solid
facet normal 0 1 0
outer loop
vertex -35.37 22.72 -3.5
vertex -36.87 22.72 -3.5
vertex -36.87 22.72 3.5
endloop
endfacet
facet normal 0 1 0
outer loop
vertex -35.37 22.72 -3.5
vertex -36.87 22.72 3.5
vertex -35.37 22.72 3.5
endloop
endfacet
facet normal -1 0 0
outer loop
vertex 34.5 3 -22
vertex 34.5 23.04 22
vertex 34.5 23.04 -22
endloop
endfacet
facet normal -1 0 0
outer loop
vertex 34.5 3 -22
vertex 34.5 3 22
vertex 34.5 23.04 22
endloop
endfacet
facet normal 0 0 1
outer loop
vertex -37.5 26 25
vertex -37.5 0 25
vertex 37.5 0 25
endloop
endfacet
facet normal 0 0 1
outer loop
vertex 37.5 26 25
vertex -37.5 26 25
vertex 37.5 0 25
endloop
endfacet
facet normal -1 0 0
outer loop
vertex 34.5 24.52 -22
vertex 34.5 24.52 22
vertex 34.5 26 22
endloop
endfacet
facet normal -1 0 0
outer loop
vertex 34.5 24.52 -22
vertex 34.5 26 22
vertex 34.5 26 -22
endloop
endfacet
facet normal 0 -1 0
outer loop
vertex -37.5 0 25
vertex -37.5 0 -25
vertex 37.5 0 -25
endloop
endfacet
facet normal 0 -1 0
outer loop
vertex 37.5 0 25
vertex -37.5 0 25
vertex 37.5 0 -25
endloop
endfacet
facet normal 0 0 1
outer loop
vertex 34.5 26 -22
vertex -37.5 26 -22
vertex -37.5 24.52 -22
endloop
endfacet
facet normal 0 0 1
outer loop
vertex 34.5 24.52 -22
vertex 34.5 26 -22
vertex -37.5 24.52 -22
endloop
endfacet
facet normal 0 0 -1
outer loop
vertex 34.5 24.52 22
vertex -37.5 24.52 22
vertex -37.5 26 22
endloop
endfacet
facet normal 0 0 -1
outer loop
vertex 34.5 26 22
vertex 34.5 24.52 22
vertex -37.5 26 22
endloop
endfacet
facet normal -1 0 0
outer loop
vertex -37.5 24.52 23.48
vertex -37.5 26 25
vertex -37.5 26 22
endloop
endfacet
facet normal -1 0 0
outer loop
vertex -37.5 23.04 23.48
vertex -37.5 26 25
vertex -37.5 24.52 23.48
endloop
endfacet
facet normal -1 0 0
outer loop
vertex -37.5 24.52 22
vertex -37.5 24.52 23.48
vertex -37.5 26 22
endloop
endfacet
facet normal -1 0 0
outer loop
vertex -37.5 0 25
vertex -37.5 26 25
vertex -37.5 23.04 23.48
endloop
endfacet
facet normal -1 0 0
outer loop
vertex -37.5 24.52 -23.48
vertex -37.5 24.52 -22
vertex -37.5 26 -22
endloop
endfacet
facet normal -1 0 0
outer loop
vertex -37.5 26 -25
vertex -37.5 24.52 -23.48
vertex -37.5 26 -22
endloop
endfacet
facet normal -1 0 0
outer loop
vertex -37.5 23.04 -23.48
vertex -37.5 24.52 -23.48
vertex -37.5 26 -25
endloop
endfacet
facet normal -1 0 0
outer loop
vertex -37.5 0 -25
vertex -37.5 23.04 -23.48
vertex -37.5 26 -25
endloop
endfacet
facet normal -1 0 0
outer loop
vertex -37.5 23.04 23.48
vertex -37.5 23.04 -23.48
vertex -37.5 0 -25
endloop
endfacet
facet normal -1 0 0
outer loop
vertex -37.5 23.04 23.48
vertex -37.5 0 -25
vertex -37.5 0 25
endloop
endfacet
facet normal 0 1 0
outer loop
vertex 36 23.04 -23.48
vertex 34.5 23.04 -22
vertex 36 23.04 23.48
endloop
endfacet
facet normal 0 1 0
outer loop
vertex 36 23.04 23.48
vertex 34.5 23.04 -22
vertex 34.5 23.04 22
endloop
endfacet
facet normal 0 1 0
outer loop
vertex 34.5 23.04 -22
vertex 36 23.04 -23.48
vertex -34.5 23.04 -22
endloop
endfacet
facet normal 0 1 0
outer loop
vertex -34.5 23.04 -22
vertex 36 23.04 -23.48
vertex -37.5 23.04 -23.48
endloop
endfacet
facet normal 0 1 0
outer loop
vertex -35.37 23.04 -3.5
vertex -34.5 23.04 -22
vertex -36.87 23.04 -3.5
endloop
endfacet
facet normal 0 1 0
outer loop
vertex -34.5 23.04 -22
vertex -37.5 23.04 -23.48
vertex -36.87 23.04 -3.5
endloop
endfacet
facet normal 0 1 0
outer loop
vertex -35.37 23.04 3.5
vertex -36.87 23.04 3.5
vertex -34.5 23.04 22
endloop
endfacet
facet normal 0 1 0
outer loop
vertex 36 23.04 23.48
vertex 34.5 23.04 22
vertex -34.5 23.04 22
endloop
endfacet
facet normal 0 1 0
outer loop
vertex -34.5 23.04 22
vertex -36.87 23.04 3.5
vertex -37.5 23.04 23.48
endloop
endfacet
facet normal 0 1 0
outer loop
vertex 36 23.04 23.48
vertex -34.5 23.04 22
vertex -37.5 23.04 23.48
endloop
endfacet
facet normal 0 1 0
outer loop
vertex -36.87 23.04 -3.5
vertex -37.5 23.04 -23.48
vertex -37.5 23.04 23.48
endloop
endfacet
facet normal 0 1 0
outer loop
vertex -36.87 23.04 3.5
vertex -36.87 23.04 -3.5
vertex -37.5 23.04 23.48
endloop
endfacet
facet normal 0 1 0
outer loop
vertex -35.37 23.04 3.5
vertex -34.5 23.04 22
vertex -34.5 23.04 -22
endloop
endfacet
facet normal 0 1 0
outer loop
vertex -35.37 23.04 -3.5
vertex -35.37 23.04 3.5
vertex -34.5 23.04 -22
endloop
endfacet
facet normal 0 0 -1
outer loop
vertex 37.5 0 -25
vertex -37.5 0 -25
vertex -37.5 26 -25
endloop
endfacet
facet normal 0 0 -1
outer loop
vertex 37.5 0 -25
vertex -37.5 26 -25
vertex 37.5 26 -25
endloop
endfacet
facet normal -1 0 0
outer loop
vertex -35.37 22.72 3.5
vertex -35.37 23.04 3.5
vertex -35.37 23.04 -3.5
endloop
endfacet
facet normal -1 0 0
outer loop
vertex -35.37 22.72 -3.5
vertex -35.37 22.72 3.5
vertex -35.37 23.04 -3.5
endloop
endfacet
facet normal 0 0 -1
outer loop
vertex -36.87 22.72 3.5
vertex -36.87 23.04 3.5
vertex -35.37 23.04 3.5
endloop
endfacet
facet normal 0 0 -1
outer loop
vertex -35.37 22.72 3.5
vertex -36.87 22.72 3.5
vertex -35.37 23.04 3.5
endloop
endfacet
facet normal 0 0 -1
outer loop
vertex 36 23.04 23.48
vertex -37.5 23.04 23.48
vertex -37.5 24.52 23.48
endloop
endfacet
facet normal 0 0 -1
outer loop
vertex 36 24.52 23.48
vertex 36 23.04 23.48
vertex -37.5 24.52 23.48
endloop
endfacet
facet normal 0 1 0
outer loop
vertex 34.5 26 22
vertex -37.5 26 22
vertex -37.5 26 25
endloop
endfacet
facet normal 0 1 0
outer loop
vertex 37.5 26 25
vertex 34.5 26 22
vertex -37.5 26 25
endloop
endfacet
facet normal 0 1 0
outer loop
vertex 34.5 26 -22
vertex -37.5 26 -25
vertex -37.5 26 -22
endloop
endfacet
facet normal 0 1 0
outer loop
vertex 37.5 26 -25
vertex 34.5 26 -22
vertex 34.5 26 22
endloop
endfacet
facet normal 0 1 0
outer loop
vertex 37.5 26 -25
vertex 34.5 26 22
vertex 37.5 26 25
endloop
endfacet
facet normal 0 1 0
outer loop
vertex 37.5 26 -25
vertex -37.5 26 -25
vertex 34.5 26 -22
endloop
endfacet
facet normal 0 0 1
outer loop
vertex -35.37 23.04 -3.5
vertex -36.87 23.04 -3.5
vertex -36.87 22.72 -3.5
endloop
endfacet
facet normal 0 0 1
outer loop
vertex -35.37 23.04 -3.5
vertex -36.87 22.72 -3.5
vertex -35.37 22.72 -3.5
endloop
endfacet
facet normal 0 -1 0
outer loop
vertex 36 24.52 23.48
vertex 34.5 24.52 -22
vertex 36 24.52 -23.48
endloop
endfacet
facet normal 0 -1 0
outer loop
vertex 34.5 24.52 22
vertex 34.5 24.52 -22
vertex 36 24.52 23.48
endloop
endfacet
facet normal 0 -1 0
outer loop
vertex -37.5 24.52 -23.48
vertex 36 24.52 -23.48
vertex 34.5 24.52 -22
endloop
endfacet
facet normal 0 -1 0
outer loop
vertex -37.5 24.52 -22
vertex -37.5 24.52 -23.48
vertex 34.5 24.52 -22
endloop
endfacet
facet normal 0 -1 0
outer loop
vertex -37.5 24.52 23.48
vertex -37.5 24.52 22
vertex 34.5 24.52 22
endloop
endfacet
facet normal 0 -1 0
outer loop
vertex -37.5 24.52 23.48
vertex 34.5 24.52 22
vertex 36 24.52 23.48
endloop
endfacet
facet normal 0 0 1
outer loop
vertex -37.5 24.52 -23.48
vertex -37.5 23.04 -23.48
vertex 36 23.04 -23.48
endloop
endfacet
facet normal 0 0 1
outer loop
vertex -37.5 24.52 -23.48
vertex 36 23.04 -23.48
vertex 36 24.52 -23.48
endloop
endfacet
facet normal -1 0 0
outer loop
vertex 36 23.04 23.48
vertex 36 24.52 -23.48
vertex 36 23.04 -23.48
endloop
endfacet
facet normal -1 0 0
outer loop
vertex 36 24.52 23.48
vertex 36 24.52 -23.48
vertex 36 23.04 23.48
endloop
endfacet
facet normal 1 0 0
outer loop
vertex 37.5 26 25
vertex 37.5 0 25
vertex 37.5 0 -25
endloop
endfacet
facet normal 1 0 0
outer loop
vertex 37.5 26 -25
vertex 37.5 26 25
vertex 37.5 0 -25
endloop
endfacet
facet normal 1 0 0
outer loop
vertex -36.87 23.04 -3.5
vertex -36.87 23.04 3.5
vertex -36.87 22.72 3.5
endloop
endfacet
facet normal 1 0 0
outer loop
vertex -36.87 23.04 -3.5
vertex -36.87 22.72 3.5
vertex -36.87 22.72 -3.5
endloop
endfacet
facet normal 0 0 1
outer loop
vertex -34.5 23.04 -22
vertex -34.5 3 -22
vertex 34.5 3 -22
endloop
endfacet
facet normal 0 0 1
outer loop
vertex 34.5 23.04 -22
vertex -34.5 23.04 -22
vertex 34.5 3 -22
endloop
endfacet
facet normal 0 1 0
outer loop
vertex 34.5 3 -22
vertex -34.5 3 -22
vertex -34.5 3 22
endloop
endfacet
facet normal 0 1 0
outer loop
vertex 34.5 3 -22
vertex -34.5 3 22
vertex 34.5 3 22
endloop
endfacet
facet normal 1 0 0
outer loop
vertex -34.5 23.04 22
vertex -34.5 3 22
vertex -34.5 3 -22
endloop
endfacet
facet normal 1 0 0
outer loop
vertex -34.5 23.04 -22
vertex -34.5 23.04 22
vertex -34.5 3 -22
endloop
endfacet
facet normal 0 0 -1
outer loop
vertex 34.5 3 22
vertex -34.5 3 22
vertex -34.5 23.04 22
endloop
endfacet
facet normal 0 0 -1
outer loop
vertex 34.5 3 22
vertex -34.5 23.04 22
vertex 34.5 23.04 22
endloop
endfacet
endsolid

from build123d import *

# Parameters (mm, degrees)
CROQUIS1_W              = 75
CROQUIS1_H              = 50
CROQUIS1_W_2            = 69
CROQUIS1_H_2            = 44
SALIENTE_EXTRUIR1_DEPTH = 26
CROQUIS1_2_W            = 69
CROQUIS1_2_H            = 44
SALIENTE_EXTRUIR2_DEPTH = 3
CORTAR_EXTRUIR1_DEPTH   = 72
CROQUIS4_W              = 46.96
CROQUIS4_H              = 1.48
CORTAR_EXTRUIR2_DEPTH   = 1.5
CROQUIS7_W              = 1.5
CROQUIS7_H              = 7
CORTAR_EXTRUIR3_DEPTH   = 0.32


with BuildPart() as part:
    # Croquis1 → Saliente-Extruir1 (new body)
    with BuildSketch(Plane(origin=(0, 0, 0), x_dir=(1, 0, 0), z_dir=(0, 1, 0))):
        Rectangle(CROQUIS1_W, CROQUIS1_H)
        Rectangle(CROQUIS1_W_2, CROQUIS1_H_2, mode=Mode.SUBTRACT)
    extrude(amount=SALIENTE_EXTRUIR1_DEPTH)

    # Croquis1<2> → Saliente-Extruir2 (add)
    with BuildSketch(Plane(origin=(0, 0, 0), x_dir=(1, 0, 0), z_dir=(0, 1, 0))):
        Rectangle(CROQUIS1_2_W, CROQUIS1_2_H)
    extrude(amount=SALIENTE_EXTRUIR2_DEPTH)

    # Croquis3 → Cortar-Extruir1 (cut)
    with BuildSketch(Plane.ZY.offset(37.5)):
        Polygon((22, 26), (-22, 26), (-22, 24.52), (-23.48, 24.52), (-23.48, 23.04), (23.48, 23.04), (23.48, 24.52), (22, 24.52), align=None)
    extrude(amount=-CORTAR_EXTRUIR1_DEPTH, mode=Mode.SUBTRACT)

    # Croquis4 → Cortar-Extruir2 (cut)
    with BuildSketch(Plane.ZY.offset(-34.5)):
        with Locations((0, 23.78)):
            Rectangle(CROQUIS4_W, CROQUIS4_H)
    extrude(amount=-CORTAR_EXTRUIR2_DEPTH, mode=Mode.SUBTRACT)

    # Croquis7 → Cortar-Extruir3 (cut)
    with BuildSketch(Plane(origin=(0, 23.04, 0), x_dir=(1, 0, 0), z_dir=(0, 1, 0))):
        with Locations((-36.12, 0)):
            Rectangle(CROQUIS7_W, CROQUIS7_H)
    extrude(amount=-CORTAR_EXTRUIR3_DEPTH, mode=Mode.SUBTRACT)


solid = part.part
